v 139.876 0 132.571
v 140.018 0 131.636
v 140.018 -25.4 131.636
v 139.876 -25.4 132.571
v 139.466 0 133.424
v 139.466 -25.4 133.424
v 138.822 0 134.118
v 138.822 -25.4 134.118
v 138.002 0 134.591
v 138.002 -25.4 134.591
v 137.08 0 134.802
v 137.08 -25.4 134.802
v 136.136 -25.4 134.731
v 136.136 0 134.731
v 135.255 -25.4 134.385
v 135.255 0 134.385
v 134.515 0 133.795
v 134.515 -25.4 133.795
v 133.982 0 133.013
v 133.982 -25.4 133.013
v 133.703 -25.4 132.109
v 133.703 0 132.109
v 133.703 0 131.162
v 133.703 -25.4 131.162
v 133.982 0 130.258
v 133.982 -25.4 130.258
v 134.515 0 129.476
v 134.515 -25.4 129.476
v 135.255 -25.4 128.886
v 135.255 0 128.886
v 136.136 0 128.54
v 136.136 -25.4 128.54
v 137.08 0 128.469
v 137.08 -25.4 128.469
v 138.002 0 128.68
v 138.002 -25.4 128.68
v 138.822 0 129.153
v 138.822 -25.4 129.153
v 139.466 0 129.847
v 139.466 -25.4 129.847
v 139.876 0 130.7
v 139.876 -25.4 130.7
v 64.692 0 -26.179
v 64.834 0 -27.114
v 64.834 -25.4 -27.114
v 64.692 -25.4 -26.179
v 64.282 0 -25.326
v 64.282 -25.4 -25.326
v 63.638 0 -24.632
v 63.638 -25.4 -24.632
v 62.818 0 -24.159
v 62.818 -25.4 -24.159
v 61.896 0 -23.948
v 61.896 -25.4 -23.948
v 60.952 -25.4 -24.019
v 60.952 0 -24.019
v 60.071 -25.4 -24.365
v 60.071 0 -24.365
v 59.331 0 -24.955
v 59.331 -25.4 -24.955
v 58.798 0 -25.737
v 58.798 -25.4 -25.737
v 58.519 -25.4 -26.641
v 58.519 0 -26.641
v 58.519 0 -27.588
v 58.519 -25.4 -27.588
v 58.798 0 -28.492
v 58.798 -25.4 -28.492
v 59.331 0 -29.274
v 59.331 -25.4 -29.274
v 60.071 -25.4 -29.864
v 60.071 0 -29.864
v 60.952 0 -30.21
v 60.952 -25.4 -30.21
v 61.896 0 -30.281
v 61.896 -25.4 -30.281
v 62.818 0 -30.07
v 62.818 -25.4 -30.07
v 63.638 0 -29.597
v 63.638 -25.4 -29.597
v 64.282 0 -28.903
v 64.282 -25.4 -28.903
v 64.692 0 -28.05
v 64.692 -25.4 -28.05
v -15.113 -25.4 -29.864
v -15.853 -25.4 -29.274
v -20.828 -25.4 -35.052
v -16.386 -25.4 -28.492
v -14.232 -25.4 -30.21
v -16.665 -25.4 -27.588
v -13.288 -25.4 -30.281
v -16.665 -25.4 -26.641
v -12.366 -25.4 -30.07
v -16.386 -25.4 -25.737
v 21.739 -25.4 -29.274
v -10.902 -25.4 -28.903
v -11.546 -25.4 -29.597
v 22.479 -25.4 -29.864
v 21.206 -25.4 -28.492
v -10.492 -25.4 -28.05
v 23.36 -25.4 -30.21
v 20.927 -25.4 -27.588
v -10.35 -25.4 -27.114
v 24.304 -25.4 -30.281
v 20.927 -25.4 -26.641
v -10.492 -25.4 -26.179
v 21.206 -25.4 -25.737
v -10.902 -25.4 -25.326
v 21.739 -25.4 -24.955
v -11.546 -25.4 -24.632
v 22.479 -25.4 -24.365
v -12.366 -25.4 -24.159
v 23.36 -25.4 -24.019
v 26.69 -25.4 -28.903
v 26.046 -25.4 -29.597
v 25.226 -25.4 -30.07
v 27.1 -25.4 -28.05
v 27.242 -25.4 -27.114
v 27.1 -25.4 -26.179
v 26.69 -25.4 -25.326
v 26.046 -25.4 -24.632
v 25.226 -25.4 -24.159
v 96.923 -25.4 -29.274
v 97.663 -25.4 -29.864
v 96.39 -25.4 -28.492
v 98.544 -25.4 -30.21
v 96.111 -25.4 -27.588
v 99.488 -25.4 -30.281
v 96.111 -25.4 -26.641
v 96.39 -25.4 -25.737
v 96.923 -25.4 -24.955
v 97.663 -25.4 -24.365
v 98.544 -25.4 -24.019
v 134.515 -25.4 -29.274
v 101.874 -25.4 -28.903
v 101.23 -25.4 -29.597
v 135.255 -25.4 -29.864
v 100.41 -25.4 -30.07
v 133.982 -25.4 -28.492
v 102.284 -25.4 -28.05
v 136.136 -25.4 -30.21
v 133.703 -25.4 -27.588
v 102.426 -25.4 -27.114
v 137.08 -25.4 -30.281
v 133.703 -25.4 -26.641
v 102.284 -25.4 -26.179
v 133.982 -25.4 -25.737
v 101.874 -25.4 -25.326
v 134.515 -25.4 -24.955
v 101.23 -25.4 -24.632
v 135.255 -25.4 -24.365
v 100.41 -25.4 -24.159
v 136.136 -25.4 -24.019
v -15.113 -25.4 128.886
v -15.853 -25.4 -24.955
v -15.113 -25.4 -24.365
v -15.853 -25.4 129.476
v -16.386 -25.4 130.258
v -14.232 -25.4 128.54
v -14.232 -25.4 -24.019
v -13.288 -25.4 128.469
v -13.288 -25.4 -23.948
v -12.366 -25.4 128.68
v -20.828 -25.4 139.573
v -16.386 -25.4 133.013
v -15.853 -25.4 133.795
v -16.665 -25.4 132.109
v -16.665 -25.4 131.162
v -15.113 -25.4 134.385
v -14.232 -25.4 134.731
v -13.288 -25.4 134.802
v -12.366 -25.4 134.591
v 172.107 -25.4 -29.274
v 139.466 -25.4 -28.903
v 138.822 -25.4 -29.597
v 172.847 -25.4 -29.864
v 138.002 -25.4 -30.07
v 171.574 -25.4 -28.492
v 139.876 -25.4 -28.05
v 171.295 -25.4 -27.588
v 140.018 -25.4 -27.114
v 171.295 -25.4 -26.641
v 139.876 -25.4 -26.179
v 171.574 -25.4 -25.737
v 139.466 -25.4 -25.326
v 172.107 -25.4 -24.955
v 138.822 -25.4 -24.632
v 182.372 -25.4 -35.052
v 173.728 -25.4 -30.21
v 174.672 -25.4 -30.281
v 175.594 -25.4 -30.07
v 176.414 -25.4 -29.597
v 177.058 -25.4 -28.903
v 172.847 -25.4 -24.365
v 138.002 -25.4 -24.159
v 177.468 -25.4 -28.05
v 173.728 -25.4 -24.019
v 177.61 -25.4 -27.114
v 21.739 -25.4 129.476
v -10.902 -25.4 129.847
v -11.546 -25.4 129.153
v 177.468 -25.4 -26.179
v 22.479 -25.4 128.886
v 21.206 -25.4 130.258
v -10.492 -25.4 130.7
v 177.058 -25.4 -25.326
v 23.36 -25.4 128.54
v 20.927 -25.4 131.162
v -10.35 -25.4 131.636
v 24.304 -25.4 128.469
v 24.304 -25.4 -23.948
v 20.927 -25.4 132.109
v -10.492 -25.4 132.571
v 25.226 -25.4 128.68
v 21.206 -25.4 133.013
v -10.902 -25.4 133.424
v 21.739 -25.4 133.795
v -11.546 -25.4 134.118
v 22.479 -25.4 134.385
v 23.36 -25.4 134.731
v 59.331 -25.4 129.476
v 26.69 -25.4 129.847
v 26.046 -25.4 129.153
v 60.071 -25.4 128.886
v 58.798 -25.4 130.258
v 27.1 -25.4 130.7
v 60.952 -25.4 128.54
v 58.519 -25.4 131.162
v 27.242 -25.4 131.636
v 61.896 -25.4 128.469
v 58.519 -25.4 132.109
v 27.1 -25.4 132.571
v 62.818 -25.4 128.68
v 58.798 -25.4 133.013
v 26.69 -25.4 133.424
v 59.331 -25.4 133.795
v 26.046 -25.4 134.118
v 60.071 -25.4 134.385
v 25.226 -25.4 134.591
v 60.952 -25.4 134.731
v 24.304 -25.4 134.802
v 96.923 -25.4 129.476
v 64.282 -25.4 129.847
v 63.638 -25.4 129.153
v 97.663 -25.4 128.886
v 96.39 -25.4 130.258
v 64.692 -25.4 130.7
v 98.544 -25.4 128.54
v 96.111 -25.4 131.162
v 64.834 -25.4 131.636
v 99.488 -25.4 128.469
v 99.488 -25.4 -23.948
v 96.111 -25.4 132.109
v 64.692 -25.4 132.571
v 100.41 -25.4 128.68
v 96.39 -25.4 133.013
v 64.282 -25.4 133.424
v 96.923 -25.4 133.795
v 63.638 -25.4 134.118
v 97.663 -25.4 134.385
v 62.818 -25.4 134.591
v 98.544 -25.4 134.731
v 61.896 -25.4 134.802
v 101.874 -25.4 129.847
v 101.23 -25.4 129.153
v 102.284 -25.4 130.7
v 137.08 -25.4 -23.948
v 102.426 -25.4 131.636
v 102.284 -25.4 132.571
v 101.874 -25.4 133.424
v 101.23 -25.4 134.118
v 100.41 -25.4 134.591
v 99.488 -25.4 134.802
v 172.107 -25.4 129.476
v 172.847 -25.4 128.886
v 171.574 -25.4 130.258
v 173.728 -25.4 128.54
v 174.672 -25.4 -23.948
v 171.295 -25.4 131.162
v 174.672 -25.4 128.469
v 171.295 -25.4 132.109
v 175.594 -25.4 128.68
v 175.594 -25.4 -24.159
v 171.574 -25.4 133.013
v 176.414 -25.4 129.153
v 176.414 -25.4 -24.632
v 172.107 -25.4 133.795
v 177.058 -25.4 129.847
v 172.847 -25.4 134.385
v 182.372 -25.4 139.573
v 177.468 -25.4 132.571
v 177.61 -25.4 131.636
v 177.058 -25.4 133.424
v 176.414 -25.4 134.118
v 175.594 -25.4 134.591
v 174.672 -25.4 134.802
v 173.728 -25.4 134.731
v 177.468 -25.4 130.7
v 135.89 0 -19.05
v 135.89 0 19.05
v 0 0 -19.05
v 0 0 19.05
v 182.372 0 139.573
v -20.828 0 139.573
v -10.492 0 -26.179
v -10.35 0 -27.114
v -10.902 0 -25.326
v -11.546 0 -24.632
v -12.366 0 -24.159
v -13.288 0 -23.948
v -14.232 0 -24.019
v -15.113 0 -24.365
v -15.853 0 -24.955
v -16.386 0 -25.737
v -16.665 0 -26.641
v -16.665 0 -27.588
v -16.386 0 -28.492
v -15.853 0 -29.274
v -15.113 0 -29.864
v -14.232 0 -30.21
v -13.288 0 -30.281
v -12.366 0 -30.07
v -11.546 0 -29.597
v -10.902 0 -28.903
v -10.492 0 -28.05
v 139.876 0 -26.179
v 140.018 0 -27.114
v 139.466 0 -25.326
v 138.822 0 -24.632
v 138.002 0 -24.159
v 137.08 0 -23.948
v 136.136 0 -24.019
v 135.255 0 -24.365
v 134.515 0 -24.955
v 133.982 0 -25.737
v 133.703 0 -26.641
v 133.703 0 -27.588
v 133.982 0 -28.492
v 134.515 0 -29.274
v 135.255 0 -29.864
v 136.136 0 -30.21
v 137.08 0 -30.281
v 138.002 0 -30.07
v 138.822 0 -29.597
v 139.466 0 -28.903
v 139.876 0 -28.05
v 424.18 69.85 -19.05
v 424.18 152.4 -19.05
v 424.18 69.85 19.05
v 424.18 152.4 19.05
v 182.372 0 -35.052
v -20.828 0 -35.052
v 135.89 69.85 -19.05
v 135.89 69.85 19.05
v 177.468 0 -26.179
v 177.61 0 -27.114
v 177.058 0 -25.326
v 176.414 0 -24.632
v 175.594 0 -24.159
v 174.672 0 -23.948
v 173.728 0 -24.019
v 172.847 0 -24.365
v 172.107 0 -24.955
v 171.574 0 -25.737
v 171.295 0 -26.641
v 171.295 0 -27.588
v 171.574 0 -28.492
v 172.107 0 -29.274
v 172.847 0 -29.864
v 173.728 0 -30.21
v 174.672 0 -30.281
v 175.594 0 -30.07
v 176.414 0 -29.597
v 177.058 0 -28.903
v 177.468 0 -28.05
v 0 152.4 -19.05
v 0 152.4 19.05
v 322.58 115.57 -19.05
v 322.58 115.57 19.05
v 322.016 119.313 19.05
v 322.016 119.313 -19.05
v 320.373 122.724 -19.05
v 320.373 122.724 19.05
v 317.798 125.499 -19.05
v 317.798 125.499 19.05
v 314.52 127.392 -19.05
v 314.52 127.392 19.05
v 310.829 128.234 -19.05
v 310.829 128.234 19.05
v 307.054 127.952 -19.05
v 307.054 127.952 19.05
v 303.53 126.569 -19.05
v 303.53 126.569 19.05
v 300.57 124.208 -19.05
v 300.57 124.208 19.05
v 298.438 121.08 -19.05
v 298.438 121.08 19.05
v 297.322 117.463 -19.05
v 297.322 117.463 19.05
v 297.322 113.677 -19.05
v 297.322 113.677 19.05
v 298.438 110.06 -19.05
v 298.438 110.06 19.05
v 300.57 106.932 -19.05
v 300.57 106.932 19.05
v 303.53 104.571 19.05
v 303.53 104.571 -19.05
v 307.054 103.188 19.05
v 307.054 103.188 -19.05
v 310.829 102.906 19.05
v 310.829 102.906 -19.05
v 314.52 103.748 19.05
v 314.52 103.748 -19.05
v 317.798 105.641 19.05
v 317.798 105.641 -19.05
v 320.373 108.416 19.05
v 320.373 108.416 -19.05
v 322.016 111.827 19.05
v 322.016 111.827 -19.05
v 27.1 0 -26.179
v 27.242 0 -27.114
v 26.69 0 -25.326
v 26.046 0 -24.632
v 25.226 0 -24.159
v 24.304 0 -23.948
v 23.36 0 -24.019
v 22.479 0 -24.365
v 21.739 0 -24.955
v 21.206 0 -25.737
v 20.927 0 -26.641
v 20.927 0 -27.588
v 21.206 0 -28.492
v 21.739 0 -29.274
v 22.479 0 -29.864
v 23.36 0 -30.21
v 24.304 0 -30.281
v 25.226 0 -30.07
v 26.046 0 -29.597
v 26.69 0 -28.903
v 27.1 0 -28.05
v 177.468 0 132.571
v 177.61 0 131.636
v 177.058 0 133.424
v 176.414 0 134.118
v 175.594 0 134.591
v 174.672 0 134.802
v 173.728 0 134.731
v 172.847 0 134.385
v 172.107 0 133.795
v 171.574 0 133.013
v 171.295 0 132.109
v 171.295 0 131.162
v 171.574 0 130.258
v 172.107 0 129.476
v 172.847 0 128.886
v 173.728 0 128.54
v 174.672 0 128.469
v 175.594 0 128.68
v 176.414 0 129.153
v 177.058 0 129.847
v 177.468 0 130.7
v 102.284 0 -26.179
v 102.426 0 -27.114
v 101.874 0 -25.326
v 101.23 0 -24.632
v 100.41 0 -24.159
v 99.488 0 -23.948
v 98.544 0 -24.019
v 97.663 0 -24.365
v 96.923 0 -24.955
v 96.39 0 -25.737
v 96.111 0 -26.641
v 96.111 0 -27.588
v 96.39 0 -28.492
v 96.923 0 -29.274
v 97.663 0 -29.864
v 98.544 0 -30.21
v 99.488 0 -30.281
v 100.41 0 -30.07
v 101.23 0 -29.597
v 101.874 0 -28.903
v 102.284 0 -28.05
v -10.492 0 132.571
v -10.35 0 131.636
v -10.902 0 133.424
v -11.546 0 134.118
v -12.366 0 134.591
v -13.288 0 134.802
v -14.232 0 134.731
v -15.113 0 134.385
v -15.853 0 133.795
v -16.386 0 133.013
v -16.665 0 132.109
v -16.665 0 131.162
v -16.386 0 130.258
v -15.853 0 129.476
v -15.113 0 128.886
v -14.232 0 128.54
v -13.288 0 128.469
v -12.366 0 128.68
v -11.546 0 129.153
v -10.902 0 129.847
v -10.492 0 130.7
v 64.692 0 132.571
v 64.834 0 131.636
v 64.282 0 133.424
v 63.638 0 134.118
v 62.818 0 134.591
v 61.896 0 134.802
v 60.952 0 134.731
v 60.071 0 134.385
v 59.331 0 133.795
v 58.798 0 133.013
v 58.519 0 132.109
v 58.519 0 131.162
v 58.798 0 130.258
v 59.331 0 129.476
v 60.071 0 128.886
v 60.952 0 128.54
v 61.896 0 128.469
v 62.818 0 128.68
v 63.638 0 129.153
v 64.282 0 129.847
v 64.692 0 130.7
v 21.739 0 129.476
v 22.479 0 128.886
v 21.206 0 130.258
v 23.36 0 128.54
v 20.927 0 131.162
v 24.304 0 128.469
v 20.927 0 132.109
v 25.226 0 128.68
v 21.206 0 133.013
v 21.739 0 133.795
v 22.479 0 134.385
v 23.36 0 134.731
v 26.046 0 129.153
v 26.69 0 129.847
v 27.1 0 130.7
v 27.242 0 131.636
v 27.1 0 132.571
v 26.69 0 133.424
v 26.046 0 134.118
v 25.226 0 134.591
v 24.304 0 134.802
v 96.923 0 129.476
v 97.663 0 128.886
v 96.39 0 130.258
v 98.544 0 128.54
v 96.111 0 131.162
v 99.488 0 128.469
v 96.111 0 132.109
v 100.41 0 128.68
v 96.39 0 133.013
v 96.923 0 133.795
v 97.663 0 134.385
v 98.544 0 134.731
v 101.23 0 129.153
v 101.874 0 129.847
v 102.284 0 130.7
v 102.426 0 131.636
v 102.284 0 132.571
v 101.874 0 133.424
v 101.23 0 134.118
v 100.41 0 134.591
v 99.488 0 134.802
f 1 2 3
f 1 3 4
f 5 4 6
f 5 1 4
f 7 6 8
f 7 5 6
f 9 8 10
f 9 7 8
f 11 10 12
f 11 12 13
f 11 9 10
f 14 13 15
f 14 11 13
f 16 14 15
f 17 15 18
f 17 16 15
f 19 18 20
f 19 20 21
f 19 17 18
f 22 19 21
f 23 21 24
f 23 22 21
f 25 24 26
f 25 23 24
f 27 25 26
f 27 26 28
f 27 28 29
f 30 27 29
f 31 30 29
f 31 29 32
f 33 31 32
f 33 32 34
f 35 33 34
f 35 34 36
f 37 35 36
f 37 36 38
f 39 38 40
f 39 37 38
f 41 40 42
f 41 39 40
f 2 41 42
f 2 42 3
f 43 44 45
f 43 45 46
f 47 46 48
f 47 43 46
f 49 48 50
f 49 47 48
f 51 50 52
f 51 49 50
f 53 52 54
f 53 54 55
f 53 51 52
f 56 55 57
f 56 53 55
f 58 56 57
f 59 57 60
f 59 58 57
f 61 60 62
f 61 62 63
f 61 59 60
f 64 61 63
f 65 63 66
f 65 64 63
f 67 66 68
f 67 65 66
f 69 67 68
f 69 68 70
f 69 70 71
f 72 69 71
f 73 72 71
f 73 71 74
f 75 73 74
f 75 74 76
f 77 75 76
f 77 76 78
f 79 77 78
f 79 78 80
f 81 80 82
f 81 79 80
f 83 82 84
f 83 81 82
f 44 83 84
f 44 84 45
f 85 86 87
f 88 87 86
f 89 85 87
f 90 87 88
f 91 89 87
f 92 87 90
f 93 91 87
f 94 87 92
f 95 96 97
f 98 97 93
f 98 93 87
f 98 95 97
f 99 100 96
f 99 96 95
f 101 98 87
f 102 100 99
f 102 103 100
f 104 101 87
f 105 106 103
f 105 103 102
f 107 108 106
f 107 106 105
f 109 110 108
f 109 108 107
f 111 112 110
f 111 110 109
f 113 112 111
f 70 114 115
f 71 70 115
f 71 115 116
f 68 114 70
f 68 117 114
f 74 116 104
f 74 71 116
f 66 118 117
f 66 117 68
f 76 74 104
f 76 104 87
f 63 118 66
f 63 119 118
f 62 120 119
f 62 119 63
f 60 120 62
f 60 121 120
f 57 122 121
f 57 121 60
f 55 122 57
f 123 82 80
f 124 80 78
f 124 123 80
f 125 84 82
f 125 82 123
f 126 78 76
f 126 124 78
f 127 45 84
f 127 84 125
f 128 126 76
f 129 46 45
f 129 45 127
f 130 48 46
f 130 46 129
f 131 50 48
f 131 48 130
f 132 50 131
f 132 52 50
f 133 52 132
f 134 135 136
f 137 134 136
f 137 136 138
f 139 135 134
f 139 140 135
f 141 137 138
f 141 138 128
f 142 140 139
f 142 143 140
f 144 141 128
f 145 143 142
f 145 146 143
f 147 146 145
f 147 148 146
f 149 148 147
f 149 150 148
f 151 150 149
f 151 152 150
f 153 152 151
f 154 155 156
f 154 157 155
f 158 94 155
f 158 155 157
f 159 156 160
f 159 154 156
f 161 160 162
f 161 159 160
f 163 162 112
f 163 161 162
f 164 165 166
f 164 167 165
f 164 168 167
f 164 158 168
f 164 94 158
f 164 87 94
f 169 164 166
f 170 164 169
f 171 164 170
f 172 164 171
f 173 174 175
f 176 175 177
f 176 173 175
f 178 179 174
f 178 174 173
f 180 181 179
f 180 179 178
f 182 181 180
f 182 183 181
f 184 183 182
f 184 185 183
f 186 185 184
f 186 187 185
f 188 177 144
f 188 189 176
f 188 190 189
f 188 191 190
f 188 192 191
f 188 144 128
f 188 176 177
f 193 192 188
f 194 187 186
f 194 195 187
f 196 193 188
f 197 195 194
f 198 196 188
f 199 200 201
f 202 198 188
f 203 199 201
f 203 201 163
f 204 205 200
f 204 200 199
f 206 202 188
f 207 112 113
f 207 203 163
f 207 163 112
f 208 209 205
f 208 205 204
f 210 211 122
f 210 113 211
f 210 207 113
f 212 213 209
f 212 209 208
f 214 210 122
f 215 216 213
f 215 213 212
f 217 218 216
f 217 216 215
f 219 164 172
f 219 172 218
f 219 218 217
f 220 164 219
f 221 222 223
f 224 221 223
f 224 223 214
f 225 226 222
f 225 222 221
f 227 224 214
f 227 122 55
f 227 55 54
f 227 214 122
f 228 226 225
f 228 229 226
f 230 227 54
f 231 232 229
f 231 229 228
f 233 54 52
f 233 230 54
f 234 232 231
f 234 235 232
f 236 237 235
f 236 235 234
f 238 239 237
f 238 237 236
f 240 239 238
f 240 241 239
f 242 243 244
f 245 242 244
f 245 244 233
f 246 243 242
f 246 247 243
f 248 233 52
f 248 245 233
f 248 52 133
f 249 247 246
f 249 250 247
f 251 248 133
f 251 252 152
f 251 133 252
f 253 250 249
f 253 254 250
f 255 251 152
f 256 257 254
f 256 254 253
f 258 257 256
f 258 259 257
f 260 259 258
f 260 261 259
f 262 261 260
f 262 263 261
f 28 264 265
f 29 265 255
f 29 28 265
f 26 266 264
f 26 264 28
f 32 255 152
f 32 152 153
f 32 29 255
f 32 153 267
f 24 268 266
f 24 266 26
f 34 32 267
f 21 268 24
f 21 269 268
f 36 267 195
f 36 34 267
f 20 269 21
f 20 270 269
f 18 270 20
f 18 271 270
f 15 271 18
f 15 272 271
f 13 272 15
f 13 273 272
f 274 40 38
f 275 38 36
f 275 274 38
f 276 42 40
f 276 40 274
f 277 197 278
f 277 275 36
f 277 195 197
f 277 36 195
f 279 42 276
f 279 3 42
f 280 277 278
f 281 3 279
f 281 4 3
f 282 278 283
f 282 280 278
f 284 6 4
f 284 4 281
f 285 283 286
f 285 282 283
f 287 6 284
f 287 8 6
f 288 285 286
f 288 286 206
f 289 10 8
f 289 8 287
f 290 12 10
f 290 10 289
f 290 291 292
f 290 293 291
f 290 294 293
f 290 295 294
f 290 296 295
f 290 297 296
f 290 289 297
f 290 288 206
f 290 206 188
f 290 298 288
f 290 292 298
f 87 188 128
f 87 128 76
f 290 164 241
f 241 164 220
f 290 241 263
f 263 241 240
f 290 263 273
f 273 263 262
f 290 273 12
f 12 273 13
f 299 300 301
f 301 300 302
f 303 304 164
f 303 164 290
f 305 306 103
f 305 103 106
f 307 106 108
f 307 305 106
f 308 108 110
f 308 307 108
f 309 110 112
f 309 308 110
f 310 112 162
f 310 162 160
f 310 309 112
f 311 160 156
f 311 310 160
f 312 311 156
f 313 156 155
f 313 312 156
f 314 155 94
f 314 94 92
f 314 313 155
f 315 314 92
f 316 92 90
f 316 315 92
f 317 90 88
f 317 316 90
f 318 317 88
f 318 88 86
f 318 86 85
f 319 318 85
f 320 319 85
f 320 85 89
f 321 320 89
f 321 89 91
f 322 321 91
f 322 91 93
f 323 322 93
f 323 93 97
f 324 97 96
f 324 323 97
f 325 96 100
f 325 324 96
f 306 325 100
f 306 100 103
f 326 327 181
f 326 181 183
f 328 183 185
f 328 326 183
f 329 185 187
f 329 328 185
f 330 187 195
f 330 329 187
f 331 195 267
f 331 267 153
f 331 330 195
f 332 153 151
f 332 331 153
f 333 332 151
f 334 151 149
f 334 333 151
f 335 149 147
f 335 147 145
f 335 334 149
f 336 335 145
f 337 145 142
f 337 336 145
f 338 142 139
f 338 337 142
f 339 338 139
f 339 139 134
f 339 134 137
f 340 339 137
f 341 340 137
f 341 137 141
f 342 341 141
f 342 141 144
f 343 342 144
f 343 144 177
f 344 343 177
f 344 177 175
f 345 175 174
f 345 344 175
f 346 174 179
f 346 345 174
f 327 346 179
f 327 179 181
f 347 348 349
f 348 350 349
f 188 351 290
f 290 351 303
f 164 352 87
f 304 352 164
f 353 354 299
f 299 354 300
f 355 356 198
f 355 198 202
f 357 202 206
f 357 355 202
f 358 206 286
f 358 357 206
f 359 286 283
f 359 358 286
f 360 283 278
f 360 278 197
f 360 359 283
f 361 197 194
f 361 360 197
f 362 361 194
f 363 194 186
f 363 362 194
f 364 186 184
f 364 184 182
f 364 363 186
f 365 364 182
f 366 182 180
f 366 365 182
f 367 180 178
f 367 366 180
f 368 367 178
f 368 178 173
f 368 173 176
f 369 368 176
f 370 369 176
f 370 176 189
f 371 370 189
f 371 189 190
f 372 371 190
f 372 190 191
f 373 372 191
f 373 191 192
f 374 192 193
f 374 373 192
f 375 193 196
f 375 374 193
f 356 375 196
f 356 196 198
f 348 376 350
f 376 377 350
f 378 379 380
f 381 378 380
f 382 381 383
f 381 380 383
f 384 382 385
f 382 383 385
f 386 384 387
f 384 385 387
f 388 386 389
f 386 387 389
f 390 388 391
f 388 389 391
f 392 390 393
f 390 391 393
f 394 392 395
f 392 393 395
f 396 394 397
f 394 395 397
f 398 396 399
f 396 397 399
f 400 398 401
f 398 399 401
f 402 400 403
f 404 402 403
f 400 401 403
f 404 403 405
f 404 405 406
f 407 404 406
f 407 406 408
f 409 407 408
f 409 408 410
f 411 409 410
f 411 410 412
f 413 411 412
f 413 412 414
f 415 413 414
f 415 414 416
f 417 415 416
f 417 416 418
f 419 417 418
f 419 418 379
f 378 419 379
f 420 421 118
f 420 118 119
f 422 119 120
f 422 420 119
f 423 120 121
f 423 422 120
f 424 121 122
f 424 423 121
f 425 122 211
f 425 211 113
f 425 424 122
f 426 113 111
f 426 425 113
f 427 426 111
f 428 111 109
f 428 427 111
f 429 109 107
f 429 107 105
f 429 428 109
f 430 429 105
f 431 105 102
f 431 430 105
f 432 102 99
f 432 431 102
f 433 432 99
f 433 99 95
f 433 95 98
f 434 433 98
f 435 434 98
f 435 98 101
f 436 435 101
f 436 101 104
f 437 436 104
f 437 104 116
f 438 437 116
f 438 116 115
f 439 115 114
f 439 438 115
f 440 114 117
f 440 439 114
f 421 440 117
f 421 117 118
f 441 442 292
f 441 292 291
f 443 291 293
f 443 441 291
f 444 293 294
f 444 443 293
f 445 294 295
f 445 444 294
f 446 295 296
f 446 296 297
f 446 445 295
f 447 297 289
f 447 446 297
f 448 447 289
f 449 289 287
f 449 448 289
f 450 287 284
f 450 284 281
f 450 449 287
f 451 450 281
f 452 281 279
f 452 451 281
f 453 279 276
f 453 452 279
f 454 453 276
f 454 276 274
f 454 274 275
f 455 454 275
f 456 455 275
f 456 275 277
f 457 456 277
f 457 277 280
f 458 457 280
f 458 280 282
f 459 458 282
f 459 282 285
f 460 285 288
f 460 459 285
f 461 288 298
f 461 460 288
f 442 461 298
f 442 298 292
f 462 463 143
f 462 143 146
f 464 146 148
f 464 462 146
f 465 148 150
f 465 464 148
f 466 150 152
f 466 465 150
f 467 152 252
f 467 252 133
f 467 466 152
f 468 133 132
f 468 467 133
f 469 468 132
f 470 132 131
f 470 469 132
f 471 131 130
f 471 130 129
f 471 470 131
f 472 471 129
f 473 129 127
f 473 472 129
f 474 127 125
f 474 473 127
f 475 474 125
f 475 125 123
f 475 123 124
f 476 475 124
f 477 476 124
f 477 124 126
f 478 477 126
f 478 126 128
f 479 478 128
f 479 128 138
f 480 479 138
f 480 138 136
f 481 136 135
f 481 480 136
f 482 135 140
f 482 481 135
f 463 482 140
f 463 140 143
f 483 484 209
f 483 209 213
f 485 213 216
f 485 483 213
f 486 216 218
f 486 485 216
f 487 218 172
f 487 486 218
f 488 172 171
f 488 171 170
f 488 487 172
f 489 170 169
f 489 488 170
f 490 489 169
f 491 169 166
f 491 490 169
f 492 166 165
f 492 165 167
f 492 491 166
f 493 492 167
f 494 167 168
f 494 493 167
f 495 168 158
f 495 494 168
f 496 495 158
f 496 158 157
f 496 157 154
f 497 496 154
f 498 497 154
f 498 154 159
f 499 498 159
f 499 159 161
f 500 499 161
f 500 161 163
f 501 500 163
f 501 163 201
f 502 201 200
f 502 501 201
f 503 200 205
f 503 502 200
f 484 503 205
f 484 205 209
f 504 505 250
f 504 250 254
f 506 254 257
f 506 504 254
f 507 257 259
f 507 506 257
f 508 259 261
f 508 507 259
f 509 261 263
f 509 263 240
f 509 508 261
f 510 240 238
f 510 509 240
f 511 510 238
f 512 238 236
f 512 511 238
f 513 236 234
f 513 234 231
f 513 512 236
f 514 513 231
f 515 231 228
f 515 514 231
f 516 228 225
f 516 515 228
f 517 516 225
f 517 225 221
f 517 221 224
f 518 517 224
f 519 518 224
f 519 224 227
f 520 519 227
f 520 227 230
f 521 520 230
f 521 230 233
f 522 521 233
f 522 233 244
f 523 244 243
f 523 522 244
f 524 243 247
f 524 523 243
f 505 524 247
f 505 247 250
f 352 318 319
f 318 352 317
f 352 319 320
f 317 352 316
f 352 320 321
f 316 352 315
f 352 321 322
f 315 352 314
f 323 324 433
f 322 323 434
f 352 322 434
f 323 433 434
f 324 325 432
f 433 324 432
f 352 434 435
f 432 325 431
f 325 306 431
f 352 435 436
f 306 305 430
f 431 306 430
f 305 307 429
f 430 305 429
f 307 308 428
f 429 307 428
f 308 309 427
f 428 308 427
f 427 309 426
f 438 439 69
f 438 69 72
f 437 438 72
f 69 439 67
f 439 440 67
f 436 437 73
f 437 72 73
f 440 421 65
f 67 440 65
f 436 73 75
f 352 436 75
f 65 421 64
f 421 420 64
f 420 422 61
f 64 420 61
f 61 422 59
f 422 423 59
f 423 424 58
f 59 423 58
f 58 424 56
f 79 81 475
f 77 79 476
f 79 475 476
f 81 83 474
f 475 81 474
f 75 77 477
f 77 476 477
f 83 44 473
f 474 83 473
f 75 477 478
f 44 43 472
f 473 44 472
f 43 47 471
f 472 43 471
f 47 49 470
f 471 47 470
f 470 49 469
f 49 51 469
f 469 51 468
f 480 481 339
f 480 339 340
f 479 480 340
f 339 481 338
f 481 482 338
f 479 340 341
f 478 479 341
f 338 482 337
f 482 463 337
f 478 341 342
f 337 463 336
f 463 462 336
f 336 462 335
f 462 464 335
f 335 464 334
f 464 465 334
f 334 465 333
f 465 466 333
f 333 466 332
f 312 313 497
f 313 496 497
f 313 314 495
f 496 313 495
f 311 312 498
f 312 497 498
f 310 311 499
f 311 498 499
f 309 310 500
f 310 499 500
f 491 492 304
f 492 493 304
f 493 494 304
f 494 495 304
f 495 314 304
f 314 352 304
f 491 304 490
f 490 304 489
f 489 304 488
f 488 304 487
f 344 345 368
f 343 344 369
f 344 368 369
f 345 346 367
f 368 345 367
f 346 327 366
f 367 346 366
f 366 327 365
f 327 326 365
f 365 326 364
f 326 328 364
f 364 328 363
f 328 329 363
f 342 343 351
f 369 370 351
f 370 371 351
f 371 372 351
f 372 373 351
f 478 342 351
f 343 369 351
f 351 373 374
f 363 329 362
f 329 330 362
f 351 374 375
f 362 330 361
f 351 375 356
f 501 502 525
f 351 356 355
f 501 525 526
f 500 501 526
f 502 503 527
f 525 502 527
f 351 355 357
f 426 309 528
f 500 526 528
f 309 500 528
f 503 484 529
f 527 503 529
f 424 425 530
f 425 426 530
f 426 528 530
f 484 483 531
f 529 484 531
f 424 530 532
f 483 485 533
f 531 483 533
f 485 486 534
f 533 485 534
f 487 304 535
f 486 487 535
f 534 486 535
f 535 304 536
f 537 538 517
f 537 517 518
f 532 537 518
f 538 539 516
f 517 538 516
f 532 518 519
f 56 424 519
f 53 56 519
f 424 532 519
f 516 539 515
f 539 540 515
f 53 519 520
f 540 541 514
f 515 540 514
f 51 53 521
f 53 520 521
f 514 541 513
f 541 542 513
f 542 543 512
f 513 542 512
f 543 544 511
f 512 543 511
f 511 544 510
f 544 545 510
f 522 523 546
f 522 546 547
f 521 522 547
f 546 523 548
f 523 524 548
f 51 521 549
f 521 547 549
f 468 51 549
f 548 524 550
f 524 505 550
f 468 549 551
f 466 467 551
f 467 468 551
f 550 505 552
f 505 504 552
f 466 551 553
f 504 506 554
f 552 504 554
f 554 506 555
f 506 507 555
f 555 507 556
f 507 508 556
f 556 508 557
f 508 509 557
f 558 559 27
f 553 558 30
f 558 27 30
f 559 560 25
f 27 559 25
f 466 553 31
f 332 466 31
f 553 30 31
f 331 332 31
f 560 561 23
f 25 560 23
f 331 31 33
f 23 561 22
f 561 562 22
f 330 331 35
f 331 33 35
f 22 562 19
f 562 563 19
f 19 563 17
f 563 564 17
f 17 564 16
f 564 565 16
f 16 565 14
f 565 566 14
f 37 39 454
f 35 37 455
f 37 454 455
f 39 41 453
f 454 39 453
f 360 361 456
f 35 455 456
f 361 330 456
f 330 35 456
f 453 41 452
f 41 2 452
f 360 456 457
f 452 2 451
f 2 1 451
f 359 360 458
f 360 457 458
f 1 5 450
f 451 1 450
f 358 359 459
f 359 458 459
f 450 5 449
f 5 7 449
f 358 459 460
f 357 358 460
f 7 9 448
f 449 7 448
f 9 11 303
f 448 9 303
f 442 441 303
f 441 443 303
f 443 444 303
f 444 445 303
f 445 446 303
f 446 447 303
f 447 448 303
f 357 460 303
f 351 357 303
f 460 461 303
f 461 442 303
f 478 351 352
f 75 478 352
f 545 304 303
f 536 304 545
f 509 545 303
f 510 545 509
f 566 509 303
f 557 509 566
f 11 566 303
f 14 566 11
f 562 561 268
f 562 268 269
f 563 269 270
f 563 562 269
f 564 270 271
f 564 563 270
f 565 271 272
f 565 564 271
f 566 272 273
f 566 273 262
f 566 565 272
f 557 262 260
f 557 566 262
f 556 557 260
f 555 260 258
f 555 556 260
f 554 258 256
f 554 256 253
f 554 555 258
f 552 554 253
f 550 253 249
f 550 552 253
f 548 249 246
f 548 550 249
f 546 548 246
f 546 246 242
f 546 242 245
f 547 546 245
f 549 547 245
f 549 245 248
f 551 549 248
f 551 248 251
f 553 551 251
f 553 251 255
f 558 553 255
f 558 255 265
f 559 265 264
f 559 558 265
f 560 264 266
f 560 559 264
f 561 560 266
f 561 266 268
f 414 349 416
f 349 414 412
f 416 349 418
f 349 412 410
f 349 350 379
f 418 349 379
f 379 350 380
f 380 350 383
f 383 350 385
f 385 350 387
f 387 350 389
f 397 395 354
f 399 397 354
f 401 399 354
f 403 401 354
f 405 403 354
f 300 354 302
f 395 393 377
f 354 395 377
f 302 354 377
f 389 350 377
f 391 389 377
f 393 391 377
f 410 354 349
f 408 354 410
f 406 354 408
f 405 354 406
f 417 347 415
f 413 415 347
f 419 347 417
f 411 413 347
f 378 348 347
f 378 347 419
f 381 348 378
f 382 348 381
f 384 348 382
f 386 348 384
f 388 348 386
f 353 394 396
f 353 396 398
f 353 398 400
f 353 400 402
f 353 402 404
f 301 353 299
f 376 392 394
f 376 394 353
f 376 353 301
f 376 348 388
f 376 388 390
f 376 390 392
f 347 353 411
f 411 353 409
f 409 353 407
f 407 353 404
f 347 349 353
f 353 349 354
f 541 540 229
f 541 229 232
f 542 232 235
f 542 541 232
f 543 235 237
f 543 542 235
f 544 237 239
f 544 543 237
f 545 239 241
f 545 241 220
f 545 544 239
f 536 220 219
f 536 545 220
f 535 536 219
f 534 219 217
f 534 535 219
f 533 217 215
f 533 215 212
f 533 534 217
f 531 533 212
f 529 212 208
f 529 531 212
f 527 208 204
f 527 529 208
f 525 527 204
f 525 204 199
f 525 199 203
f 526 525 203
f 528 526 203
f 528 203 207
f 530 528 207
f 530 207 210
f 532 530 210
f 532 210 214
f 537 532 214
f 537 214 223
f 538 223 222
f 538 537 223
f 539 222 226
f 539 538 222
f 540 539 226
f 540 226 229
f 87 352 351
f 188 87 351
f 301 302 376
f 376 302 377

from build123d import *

# Parameters (mm, degrees)
BOSS_EXTRUDE1_DEPTH = 19.05
SKETCH2_R           = 12.7
CUT_EXTRUDE1_DEPTH  = 453.333994301
SKETCH4_W           = 203.2
SKETCH4_H           = 174.625
SKETCH4_R           = 3.175
BOSS_EXTRUDE2_DEPTH = 25.4


with BuildPart() as part:
    # Sketch1 → Boss-Extrude1 (new, symmetric)
    with BuildSketch(Plane.XY):
        Polygon((0, 0), (0, 152.4), (424.18, 152.4), (424.18, 69.85), (135.89, 69.85), (135.89, 0), align=None)
    extrude(amount=BOSS_EXTRUDE1_DEPTH, both=True)

    # Sketch2 → Cut-Extrude1 (cut, through all)
    with BuildSketch(Plane.XY.offset(19.05)):
        with Locations((309.88, 115.57)):
            Circle(SKETCH2_R)
    extrude(amount=-CUT_EXTRUDE1_DEPTH, mode=Mode.SUBTRACT)


with BuildPart() as body_2:
    # Sketch4 → Boss-Extrude2 (new body)
    with BuildSketch(Plane.XZ):
        with Locations((80.772, 52.2605)):
            Rectangle(SKETCH4_W, SKETCH4_H)
        with Locations((174.4345, 131.6355)):
            Circle(SKETCH4_R, mode=Mode.SUBTRACT)
        with Locations((136.8425, 131.6355)):
            Circle(SKETCH4_R, mode=Mode.SUBTRACT)
        with Locations((99.2505, 131.6355)):
            Circle(SKETCH4_R, mode=Mode.SUBTRACT)
        with Locations((61.6585, 131.6355)):
            Circle(SKETCH4_R, mode=Mode.SUBTRACT)
        with Locations((24.0665, 131.6355)):
            Circle(SKETCH4_R, mode=Mode.SUBTRACT)
        with Locations((-13.5255, 131.6355)):
            Circle(SKETCH4_R, mode=Mode.SUBTRACT)
        with Locations((174.4345, -27.1145)):
            Circle(SKETCH4_R, mode=Mode.SUBTRACT)
        with Locations((136.8425, -27.1145)):
            Circle(SKETCH4_R, mode=Mode.SUBTRACT)
        with Locations((99.2505, -27.1145)):
            Circle(SKETCH4_R, mode=Mode.SUBTRACT)
        with Locations((61.6585, -27.1145)):
            Circle(SKETCH4_R, mode=Mode.SUBTRACT)
        with Locations((24.0665, -27.1145)):
            Circle(SKETCH4_R, mode=Mode.SUBTRACT)
        with Locations((-13.5255, -27.1145)):
            Circle(SKETCH4_R, mode=Mode.SUBTRACT)
    extrude(amount=BOSS_EXTRUDE2_DEPTH)


solid = Compound([part.part, body_2.part])
